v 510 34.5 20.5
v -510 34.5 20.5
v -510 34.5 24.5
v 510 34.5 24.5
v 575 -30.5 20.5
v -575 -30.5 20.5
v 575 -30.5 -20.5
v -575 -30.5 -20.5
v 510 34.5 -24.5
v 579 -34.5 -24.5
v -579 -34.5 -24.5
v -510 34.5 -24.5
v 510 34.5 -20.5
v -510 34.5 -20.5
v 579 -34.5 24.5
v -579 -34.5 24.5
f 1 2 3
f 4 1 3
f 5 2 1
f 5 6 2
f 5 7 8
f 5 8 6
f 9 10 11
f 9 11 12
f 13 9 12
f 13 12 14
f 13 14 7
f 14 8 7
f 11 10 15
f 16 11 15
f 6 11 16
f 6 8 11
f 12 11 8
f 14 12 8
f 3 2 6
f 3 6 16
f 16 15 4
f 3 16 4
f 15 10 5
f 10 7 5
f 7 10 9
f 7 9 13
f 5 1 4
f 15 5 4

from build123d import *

# Parameters (mm, degrees)
F0_W       = 69
F0_H       = 49
F1_DEPTH   = 579
F2_T       = -4
F3_C1_SIZE = 68.9999
F3_C2_SIZE = 68.9999


# Not quite as in the source:
# - a fillet or chamfer is up to 0.001 mm smaller than in the source, because OpenCascade refuses the exact size


with BuildPart() as f1:
    # F0 (on Right) → F1 (new body, symmetric)
    with BuildSketch(Plane.YZ):
        Rectangle(F0_W, F0_H)
    extrude(amount=F1_DEPTH, both=True)

    # F2
    f2_openings = [f1.faces().sort_by_distance(p)[0] for p in [
        (579, 0, 0),
        (0, 34.5, 0),
        (-579, 0, 0),
    ]]
    offset(amount=F2_T, openings=f2_openings)

    # F3: chamfer of 69 on 4 edges, made by hand

    # F3_c1 (size 69 in the source; OpenCascade refuses exactly that, so slightly less here)
    f3_c1_edges = [f1.edges().sort_by_distance(p)[0] for p in [
        (579, 34.5, -22.5),
    ]]
    chamfer(f3_c1_edges, length=F3_C1_SIZE)

    # F3_c2 (size 69 in the source; OpenCascade refuses exactly that, so slightly less here)
    f3_c2_edges = [f1.edges().sort_by_distance(p)[0] for p in [
        (-579, 34.5, -22.5),
    ]]
    chamfer(f3_c2_edges, length=F3_C2_SIZE)


solid = f1.part
